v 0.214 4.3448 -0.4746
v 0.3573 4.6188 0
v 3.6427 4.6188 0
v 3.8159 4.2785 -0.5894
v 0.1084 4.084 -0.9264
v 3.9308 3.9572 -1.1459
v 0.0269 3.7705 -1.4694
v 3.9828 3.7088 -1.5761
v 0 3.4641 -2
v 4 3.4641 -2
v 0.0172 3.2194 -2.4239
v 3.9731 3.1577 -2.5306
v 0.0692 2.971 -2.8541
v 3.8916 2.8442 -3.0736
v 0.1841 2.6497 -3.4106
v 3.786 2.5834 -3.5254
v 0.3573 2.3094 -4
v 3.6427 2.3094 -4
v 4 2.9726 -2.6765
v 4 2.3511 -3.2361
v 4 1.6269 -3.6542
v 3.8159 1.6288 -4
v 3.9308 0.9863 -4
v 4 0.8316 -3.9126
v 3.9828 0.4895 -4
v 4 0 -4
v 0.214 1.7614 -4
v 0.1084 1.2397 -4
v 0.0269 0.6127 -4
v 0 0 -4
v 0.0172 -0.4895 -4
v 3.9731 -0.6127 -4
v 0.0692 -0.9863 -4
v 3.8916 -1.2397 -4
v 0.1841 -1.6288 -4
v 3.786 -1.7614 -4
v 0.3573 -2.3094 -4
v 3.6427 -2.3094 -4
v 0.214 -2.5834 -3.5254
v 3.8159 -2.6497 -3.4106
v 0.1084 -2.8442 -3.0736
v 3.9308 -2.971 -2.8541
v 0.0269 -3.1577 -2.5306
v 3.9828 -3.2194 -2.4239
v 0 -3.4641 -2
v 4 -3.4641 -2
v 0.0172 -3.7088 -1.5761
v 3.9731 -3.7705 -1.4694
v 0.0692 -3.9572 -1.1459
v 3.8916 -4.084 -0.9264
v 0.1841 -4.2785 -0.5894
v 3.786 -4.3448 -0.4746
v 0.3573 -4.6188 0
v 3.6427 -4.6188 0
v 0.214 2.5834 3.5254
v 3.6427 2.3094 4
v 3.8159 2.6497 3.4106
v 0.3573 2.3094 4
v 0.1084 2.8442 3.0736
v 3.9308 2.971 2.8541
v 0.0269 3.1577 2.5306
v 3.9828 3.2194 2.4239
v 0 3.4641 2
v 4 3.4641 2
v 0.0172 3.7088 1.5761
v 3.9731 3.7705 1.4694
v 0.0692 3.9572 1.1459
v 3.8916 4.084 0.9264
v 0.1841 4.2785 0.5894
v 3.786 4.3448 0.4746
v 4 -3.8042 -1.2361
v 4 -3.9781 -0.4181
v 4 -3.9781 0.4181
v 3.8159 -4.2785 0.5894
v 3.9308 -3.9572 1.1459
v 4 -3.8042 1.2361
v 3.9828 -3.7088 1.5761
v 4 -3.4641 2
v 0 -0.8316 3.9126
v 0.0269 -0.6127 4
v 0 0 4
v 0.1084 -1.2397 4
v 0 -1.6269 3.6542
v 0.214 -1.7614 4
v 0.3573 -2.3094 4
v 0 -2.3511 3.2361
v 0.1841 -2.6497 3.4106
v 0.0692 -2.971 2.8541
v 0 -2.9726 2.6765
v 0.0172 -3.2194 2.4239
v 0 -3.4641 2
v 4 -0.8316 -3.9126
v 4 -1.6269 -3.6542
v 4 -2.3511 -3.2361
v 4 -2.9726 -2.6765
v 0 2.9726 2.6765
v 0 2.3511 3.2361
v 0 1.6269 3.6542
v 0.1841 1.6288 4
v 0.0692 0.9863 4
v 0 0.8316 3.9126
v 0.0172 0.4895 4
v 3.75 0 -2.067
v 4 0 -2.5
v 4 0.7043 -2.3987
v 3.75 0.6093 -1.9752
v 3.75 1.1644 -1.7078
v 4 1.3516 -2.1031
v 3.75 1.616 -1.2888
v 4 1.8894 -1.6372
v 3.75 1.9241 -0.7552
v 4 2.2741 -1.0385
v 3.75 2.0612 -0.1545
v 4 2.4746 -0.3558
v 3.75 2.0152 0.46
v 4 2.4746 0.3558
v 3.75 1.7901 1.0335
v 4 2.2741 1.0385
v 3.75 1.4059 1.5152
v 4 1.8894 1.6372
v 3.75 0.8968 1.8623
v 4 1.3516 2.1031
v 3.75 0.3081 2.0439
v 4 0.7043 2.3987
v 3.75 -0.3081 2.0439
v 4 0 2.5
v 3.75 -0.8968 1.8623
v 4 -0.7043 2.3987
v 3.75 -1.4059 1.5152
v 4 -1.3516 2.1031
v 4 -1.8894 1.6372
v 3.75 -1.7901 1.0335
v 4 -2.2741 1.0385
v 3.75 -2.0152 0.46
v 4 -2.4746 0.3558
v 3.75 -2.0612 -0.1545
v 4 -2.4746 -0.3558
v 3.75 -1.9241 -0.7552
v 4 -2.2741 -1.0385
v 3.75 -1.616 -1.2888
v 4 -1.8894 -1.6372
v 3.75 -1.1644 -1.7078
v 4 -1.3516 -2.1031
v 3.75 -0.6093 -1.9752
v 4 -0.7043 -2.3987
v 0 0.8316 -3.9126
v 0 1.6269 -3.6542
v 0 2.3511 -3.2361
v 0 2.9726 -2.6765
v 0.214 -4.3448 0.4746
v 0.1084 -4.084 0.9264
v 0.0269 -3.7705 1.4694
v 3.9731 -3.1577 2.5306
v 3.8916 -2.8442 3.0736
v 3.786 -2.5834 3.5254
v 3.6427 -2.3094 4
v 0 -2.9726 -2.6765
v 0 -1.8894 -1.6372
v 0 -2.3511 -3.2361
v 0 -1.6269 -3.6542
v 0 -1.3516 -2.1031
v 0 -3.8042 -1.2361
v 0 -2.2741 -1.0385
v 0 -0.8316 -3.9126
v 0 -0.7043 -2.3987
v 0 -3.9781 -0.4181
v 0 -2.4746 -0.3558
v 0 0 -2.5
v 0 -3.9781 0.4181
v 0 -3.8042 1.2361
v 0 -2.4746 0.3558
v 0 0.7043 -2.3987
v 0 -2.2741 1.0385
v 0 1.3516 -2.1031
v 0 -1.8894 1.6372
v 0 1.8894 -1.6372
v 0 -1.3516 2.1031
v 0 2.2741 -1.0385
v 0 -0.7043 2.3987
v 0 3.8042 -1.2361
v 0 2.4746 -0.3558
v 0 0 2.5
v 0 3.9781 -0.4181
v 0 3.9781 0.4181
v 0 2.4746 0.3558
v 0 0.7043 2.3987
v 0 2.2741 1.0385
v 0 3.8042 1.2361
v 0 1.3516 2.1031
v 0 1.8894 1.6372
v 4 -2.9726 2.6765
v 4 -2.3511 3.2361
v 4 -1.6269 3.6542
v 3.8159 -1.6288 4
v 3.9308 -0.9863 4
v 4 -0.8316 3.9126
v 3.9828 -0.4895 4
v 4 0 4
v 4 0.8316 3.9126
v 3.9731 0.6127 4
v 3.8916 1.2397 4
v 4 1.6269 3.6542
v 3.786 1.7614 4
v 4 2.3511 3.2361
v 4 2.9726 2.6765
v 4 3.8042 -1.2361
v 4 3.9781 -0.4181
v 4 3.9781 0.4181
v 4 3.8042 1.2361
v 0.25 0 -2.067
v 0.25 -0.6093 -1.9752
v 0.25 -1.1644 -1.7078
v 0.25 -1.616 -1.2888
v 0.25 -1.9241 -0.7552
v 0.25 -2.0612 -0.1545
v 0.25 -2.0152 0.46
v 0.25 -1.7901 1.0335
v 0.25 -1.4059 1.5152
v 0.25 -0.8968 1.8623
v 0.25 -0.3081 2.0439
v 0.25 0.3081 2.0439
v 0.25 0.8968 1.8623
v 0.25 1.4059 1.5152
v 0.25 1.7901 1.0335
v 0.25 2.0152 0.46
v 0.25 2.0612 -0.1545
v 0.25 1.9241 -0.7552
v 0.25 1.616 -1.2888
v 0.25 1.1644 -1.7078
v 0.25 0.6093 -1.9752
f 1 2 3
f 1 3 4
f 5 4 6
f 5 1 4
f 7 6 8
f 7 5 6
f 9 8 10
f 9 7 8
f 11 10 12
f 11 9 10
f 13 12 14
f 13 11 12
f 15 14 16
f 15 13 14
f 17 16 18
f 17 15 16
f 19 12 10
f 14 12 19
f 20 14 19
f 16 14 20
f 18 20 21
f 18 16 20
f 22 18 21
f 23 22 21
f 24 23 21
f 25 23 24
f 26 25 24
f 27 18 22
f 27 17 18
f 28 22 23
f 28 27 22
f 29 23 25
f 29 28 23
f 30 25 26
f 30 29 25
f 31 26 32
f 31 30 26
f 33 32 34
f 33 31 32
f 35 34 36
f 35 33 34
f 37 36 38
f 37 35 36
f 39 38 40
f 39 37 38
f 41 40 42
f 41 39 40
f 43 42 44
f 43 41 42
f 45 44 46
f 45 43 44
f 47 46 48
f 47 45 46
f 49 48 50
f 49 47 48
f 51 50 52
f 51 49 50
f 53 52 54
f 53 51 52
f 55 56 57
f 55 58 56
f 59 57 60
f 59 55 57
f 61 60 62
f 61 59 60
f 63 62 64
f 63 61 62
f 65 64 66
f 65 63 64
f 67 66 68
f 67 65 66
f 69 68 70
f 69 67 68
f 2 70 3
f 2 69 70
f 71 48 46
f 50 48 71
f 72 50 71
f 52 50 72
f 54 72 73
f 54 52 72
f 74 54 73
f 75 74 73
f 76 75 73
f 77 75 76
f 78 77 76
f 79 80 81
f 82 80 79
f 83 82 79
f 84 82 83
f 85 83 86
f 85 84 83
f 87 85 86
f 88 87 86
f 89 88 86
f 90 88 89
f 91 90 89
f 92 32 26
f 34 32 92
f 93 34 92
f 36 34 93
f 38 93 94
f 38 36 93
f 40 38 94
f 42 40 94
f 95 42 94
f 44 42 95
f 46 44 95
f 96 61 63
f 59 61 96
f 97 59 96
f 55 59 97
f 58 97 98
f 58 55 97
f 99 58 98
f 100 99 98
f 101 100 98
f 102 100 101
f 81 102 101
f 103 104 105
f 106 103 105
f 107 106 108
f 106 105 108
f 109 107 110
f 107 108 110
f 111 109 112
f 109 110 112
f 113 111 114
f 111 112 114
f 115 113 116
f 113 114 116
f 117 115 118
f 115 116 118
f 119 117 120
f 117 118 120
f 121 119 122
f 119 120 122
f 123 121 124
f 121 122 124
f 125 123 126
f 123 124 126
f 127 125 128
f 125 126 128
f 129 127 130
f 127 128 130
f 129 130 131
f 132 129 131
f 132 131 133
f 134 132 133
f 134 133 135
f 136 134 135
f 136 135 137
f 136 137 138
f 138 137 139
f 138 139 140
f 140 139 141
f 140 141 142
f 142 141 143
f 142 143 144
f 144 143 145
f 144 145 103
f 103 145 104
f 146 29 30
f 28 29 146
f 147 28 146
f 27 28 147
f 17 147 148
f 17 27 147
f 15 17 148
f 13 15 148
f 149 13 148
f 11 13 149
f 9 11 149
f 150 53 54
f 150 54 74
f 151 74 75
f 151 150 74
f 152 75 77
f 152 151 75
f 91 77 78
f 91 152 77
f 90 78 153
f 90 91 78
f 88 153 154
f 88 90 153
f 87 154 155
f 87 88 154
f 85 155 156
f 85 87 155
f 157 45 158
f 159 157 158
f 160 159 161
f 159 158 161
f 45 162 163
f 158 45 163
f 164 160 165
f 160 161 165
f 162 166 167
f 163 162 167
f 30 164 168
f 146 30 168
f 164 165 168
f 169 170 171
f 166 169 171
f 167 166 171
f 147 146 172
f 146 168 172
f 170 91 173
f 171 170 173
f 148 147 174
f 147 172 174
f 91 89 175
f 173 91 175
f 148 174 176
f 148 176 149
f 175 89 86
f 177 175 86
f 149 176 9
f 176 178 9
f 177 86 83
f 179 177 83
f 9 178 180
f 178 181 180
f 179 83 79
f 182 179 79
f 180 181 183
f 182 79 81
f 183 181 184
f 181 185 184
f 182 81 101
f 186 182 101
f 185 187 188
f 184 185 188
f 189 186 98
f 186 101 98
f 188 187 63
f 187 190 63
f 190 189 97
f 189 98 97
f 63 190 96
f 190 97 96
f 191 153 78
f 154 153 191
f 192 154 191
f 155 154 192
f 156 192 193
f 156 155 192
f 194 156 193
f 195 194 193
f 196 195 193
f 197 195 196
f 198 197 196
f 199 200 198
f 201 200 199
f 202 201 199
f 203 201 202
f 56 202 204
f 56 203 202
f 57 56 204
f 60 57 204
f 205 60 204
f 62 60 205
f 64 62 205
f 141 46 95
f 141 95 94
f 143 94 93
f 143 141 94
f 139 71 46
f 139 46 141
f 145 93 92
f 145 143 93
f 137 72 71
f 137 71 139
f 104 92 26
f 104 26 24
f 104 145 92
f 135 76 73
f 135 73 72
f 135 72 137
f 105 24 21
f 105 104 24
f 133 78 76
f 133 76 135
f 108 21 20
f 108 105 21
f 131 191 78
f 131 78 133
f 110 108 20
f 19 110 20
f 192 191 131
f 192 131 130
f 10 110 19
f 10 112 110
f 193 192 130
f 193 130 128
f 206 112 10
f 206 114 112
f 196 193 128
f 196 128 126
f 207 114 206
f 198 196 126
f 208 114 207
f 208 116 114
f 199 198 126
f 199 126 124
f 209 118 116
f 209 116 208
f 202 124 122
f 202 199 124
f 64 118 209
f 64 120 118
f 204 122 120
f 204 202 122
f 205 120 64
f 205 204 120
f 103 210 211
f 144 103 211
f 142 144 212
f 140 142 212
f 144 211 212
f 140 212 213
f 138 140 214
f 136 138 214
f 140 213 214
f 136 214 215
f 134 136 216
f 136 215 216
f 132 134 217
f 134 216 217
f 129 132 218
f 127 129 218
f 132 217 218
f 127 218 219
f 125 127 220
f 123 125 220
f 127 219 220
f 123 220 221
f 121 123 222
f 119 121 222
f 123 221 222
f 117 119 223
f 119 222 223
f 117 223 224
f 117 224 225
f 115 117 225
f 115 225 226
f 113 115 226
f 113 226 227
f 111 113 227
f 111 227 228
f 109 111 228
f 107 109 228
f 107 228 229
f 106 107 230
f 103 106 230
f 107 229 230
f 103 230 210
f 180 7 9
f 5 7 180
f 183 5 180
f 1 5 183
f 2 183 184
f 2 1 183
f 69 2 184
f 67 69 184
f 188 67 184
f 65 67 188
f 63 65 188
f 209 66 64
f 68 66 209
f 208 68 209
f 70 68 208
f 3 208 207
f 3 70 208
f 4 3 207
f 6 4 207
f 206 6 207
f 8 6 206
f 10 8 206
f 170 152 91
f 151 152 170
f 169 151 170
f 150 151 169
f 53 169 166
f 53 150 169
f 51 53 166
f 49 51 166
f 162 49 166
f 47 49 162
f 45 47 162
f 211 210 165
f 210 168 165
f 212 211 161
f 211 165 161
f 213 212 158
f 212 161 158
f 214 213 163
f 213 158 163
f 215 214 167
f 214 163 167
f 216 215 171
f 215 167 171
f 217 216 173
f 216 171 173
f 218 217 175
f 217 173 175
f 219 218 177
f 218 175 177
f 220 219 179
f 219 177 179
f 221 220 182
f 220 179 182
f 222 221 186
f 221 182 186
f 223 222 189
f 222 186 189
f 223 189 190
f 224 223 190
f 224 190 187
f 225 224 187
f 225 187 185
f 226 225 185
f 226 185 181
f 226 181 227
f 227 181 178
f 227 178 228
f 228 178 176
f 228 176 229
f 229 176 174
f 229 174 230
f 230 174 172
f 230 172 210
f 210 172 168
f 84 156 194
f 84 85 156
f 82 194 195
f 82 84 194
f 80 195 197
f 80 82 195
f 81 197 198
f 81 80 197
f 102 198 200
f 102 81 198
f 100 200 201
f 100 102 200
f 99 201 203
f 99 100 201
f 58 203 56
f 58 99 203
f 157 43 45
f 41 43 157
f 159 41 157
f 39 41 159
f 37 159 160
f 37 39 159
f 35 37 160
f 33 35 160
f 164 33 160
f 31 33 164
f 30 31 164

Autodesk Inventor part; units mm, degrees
ref_plane "YZ Plane" through (0, 0, 0) normal (1, 0, 0) x (0, 1, 0)
ref_plane "XZ Plane" through (0, 0, 0) normal (0, 1, 0) x (-1, 0, 0)
sketch "Sketch1" plane through (0, 0, 0) normal (1, 0, 0) x (0, 1, 0)
  line L0 (-4.6188, 0) -> (-2.3094, 4)
  line L1 (-2.3094, 4) -> (2.3094, 4)
  line L2 (2.3094, 4) -> (4.6188, 0)
  line L3 (4.6188, 0) -> (2.3094, -4)
  line L4 (2.3094, -4) -> (-2.3094, -4)
  line L5 (-2.3094, -4) -> (-4.6188, 0)
  point P0 (0, 0)
  point P1 (0, 0)
  dimension "d0" = 9.2376
extrude "Body" add sketch "Sketch1" along normal blind 4
sketch "Sketch2" plane through (0, 0, 0) normal (0, 0, 1) x (1, 0, 0)
  line L0 (0, 2.3094) -> (0, 4.6188) projected
  line L1 (0, 4.6188) -> (4, 4.6188) projected
  line L2 (4, 2.3094) -> (4, 4.6188) projected
  line L3 (-0.8, 0) -> (4.8, 0) projected
  line L4 (0.3573, 4.6188) -> (0, 4)
  line L5 (3.6427, 4.6188) -> (4, 4)
  dimension "d3" = 30
  dimension "d4" = 30
  dimension "d5" = 8
  dimension "d6" = 8
revolve "Chamfer1" cut sketch "Sketch2" angle 360 about axis through (-10, 0, 0) along (1, 0, 0)
sketch "Sketch3" plane through (4, 0, 0) normal (1, 0, 0) x (0, 0, -1)
  arc A0 (-2, -3.4641) -> (2, -3.4641) centre (0, 0) ccw projected
hole "Thread" at (4, 0, 0) direction (-1, 0, 0) diameter 4.134 end through all thread size "M5x0.8" class "6H" standard "ISO Metric profile"
chamfer "Chamfer2" distance 0.433 angle 30 1 edges at (4, 0, 2.067) measured on face at (4, 3.336, -0.083)
chamfer "Chamfer3" distance 0.433 angle 30 1 edges at (0, 0, 2.067) measured on face at (0, 3.336, -0.083)
ref_plane "Work Plane1" through (-8.8582, 0, 0) normal (0, -0.866, -0.5) x (1, 0, 0)
equation "\"d0\" = 1.1547 * SW"
equation "\"d1\" = KOH"
equation "\"d3\" = ANG1"
equation "\"d4\" = ANG2"
equation "\"d5\" = SW0"
equation "\"d6\" = SW01"
equation "\"d8\" = -0.5 * GD1 + 0.5 * NND"
equation "\"d40\" = -0.5 * GD1 + 0.5 * NND"
equation "\"d10\" = -0.5 * GD1 + 0.5 * NND"
equation "\"d41\" = -0.5 * GD1 + 0.5 * NND"
equation "\"ANG1\" = 30deg"
equation "\"ANG2\" = 30deg"
equation "\"NND\" = 5"
equation "\"KOH\" = 4"
equation "\"SW\" = 8"
equation "\"SW0\" = SW"
equation "\"SW01\" = SW"
equation "\"GUL\" = 0.541266 * PTC"
equation "\"THREADDIA\" = 5"
equation "\"TOA\" = 30deg"
equation "\"PTC\" = 0.8"
equation "\"E0\" = 1.155 * SW"
equation "\"GAL\" = 0.541266 * PTC"
equation "\"GD1\" = 4.133975"
properties part number "JIS B 1181 - HN - Class 2 Finished M5" material "Steel, Mild"
